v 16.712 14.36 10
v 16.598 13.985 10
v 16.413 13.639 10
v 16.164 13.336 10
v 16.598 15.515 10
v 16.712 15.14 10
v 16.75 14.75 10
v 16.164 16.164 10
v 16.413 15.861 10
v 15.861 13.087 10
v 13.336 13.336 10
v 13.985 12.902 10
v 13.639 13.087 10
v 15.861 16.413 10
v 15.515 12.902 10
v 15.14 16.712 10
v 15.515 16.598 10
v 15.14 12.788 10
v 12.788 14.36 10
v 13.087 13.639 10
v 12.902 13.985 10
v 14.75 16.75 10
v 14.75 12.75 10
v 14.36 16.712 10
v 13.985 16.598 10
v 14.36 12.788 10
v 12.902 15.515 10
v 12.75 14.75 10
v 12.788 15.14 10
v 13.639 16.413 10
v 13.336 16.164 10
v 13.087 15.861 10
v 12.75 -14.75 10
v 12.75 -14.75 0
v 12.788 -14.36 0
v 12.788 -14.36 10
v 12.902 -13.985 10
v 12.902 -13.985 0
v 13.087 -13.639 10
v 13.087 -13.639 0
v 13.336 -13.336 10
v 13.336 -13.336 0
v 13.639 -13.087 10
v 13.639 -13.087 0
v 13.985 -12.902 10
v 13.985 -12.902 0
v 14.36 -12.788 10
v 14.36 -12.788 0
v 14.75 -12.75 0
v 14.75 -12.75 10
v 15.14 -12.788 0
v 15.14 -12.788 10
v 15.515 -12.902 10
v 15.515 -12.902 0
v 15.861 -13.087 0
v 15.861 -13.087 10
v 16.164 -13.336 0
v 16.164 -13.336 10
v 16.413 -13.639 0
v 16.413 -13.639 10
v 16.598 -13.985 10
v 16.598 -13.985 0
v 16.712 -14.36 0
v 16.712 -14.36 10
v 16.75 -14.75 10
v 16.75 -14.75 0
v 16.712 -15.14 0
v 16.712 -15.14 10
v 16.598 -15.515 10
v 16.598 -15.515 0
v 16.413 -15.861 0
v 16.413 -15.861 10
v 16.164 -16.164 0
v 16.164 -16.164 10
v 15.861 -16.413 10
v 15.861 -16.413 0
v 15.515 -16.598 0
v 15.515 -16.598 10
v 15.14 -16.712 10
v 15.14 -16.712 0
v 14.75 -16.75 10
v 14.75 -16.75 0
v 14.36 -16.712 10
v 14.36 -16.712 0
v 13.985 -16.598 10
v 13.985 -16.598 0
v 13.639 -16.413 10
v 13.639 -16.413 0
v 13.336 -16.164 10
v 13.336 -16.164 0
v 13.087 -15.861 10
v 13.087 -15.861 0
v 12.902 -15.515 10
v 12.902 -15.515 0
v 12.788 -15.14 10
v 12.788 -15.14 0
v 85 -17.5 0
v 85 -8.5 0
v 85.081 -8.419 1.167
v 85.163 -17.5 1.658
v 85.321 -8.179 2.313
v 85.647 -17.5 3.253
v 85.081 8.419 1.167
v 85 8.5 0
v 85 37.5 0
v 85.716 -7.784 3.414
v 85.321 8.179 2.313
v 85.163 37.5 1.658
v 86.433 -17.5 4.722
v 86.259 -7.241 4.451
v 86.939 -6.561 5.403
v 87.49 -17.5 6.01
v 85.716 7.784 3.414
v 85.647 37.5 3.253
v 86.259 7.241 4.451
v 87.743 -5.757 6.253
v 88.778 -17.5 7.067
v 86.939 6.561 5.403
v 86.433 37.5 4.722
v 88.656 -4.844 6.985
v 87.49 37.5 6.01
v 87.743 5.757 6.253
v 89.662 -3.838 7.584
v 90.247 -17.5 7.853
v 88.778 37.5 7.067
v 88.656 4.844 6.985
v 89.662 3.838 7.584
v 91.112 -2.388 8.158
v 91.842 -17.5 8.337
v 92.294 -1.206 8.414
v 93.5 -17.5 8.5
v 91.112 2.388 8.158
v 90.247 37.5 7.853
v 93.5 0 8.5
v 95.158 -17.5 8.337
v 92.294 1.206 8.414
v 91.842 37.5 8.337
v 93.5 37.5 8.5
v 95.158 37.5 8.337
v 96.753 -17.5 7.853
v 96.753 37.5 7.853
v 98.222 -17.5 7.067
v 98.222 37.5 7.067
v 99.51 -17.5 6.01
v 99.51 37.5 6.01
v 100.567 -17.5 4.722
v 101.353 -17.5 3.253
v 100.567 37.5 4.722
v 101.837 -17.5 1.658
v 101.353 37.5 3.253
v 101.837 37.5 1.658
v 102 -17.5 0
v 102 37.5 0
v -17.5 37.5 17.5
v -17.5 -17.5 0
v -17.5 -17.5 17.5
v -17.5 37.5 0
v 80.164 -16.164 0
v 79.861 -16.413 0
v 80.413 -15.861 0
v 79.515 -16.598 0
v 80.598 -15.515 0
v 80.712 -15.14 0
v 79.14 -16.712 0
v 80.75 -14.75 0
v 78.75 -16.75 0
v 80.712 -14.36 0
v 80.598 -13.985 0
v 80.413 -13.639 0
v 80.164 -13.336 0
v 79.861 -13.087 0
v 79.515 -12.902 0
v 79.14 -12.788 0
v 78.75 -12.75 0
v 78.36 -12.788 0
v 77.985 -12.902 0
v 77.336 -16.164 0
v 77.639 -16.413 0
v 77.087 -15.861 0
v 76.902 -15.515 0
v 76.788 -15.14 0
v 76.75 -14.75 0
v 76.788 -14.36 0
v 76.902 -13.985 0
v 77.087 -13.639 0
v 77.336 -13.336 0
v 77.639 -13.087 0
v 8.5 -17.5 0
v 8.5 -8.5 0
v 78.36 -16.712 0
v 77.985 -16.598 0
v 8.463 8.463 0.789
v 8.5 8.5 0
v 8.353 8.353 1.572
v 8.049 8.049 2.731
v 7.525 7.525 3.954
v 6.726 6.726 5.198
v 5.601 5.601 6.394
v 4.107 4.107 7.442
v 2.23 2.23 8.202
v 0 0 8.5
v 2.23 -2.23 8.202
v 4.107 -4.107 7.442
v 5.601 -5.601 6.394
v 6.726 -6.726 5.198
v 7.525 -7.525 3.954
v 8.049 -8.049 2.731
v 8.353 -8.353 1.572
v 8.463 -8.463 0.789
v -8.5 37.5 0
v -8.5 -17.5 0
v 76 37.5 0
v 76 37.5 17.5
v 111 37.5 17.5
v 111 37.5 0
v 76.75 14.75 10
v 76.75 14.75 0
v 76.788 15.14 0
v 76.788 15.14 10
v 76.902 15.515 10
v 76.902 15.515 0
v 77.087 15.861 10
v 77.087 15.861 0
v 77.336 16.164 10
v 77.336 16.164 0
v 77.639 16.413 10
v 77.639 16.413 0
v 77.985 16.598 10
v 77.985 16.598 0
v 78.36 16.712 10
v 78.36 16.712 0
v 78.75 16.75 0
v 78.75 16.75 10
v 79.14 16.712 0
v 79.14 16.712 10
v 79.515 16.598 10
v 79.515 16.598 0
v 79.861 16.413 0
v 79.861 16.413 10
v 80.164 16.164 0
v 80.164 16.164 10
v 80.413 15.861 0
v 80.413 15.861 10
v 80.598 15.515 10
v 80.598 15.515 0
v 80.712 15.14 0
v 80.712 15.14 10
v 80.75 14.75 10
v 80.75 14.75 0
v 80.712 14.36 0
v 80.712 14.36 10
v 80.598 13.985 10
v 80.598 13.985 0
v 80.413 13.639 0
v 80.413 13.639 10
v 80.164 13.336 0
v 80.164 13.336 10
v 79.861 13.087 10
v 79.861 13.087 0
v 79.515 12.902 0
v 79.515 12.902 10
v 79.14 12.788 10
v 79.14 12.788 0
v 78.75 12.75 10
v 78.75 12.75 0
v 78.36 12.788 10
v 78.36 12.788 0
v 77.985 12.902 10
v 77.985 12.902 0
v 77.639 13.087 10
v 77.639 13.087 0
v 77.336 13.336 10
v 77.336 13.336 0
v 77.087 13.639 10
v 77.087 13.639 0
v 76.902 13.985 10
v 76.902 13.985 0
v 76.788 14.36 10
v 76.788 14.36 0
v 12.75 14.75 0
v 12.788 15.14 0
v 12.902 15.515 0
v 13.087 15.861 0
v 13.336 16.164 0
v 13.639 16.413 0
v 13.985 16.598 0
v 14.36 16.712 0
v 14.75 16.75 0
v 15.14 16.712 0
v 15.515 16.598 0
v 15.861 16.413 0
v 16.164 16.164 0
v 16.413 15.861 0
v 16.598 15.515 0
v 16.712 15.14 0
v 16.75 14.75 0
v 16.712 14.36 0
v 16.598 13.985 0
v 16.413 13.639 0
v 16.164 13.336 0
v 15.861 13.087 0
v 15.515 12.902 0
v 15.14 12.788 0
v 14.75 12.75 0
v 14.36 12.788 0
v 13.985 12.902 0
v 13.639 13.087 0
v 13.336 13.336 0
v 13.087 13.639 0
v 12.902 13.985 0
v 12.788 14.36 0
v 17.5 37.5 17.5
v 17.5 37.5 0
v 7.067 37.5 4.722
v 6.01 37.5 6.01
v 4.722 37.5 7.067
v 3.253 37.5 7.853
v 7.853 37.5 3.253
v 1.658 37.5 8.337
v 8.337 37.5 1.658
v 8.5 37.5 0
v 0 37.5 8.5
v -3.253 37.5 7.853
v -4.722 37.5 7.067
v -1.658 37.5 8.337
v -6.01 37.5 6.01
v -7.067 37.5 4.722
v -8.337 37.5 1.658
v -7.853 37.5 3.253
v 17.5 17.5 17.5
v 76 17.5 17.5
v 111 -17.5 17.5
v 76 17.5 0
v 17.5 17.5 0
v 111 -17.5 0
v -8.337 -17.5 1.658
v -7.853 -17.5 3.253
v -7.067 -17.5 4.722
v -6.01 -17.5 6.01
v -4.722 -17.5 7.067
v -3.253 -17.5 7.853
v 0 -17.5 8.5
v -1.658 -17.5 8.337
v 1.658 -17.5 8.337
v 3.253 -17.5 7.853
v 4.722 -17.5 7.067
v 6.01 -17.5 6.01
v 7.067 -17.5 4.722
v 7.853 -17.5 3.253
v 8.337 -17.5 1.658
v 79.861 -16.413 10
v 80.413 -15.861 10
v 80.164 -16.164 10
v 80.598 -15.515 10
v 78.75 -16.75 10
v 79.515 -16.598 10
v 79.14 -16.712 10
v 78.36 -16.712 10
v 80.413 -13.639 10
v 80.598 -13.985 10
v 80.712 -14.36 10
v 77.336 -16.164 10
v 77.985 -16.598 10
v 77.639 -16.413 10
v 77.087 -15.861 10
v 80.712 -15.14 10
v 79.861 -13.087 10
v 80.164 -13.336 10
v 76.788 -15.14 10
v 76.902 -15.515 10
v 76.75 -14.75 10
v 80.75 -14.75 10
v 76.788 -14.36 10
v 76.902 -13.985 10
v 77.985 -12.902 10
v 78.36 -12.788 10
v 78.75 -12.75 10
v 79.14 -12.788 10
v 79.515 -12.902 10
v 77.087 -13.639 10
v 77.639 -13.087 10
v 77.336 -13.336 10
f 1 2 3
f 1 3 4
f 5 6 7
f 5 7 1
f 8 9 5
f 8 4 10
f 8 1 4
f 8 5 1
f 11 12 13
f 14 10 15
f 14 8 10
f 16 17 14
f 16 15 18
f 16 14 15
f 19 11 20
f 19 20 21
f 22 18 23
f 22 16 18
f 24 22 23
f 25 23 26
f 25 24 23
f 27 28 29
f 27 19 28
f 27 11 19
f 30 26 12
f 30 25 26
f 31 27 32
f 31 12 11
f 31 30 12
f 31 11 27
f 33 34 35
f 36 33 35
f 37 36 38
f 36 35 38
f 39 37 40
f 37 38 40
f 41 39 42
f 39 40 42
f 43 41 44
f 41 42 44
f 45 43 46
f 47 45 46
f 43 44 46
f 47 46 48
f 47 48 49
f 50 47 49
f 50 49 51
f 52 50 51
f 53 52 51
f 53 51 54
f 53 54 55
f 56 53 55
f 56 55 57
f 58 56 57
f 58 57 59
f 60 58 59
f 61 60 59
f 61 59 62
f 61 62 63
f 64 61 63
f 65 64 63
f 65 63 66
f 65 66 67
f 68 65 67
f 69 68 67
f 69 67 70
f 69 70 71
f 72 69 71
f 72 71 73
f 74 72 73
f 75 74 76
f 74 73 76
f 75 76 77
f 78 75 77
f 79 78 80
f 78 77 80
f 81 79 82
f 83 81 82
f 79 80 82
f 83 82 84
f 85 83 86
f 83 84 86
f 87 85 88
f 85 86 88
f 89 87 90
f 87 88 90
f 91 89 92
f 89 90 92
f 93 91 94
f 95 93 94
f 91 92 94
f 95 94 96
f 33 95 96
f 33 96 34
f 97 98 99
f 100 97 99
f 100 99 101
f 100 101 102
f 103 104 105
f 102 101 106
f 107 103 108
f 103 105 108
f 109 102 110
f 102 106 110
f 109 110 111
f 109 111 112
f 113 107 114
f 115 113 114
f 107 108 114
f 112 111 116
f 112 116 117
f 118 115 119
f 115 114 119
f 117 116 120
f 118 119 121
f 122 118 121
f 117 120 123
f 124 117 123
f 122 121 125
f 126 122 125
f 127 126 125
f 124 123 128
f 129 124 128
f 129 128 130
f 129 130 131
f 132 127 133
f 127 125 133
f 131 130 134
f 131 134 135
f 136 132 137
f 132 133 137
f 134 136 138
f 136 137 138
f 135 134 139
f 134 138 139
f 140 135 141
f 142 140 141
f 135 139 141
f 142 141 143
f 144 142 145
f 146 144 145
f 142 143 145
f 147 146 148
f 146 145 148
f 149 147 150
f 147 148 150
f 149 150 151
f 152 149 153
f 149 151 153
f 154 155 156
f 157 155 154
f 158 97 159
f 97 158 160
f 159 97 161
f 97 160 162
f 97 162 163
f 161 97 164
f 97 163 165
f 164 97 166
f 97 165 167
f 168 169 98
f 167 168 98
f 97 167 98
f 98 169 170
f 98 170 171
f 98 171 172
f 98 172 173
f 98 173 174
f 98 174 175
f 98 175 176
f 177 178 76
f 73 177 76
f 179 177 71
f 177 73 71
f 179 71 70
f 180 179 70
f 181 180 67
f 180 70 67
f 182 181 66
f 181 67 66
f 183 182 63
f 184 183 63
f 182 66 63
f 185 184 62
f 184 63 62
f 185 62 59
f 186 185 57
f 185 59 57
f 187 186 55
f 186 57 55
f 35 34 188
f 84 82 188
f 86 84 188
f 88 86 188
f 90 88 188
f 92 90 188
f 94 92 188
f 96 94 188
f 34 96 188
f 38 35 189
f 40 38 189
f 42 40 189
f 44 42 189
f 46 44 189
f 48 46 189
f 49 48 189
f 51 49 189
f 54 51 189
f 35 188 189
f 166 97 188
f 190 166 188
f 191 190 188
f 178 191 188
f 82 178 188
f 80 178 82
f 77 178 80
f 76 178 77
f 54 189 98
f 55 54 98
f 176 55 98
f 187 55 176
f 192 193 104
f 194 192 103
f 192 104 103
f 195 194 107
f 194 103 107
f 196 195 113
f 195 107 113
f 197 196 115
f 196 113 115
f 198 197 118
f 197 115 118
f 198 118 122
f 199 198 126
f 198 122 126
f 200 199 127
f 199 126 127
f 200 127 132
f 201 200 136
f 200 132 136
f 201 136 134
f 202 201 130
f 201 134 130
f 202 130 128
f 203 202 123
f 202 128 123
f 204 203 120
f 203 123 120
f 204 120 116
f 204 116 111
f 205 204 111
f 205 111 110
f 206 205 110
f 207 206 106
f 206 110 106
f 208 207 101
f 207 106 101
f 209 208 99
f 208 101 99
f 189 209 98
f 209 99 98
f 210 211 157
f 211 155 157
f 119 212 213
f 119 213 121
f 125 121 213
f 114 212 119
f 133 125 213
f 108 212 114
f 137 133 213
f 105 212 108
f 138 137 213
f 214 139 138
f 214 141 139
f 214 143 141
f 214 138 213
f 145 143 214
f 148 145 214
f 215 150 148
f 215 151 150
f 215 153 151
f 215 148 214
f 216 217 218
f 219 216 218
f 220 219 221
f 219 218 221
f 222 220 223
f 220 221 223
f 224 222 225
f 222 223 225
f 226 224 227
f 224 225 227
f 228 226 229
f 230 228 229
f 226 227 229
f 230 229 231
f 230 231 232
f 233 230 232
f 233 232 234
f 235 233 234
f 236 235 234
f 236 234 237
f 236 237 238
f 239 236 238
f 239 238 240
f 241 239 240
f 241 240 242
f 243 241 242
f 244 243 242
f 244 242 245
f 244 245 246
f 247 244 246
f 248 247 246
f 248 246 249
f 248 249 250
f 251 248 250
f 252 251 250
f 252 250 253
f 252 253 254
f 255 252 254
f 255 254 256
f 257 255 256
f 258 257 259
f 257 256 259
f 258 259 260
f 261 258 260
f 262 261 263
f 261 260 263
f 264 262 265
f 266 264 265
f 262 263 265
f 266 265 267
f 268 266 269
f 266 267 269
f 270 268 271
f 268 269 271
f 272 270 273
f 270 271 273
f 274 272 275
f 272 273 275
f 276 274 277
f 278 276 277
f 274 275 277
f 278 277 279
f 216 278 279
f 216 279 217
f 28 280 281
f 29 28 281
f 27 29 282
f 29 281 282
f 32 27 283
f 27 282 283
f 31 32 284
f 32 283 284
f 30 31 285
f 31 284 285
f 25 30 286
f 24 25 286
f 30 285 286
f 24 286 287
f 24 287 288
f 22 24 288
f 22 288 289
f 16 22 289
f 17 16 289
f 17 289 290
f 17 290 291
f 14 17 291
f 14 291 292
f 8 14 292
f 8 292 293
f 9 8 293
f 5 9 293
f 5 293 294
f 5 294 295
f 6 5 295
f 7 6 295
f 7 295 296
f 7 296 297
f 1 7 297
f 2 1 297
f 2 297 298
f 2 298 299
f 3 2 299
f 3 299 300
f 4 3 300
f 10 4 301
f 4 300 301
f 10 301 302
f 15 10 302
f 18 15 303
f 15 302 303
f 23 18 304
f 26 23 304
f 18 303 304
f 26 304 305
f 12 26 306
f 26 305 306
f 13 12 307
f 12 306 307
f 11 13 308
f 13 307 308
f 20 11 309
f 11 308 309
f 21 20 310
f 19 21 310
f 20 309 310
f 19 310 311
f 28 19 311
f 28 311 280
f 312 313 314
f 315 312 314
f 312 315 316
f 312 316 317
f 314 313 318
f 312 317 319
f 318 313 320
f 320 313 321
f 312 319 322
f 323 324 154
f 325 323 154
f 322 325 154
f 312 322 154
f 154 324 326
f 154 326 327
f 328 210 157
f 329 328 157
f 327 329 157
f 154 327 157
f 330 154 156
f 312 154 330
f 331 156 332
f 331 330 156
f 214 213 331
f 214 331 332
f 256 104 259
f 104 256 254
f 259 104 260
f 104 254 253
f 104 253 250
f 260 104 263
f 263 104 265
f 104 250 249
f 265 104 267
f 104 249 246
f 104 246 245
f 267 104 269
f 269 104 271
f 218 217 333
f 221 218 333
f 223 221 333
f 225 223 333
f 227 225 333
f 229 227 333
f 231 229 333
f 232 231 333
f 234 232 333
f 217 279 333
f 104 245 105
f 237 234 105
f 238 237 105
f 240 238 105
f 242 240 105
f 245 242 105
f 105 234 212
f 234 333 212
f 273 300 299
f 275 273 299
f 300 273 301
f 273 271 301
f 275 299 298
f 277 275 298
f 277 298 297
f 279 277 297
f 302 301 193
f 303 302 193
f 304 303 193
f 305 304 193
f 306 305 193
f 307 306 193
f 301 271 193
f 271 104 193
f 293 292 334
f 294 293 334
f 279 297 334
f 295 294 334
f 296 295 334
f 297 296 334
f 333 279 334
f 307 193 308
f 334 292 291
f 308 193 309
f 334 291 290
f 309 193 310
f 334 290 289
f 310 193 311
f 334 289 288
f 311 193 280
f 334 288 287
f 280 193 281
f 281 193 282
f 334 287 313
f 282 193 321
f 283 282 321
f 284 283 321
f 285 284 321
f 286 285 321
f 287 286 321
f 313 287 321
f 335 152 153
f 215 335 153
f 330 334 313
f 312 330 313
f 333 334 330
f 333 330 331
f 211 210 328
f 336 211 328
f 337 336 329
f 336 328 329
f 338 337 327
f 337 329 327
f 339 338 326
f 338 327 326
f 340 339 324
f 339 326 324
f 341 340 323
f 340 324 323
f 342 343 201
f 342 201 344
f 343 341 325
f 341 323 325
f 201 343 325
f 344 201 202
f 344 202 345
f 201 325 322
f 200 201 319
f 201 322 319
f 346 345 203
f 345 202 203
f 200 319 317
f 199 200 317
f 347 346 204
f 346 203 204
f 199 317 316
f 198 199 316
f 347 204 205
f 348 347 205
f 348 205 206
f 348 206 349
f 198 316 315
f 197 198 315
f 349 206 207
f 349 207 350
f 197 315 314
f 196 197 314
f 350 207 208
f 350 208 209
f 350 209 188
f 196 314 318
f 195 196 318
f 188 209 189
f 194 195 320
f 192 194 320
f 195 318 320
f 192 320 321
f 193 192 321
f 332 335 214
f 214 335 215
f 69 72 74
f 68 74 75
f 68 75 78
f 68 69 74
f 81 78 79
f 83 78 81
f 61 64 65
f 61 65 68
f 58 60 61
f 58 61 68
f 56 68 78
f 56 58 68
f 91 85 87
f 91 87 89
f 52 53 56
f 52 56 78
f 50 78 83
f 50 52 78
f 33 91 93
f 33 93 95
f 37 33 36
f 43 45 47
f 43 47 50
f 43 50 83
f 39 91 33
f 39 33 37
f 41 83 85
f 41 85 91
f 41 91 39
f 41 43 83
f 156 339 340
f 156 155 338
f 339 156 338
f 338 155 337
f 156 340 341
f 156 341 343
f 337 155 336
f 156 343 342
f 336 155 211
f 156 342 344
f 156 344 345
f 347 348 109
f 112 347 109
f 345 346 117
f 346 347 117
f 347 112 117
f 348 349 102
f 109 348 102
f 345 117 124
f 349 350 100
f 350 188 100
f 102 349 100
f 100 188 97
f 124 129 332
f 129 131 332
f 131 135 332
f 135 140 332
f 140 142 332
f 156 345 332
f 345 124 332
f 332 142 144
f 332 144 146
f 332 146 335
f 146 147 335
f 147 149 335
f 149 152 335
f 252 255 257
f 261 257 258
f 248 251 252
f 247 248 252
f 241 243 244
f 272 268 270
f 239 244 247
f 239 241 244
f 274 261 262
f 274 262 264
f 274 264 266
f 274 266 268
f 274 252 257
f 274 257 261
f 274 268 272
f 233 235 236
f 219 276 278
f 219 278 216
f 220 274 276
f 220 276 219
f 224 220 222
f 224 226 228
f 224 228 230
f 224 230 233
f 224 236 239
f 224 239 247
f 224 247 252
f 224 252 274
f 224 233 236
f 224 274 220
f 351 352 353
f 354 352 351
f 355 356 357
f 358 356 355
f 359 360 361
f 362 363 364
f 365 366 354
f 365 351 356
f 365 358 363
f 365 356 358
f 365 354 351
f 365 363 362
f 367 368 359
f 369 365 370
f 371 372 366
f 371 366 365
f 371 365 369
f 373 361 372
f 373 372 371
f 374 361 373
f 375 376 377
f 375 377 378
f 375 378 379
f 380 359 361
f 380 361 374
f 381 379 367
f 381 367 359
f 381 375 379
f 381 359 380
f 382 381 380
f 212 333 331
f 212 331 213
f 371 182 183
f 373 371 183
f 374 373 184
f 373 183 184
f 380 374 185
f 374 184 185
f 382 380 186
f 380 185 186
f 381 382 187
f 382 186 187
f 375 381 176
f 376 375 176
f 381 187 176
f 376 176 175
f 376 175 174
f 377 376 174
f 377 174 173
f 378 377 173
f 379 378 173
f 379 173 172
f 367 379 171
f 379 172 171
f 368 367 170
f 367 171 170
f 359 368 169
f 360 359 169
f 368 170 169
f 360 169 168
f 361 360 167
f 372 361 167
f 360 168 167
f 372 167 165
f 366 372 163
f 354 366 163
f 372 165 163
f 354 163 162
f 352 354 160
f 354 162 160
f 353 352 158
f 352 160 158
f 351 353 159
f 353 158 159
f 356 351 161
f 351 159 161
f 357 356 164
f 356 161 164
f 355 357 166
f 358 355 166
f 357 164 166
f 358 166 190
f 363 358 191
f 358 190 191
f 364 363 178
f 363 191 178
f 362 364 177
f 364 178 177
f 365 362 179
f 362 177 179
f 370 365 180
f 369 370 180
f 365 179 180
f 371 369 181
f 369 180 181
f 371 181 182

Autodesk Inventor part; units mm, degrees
ref_plane "YZ Plane" through (0, 0, 0) normal (1, 0, 0) x (0, 1, 0)
ref_plane "XZ Plane" through (0, 0, 0) normal (0, 1, 0) x (-1, 0, 0)
ref_plane "XY Plane" through (0, 0, 0) normal (0, 0, 1) x (1, 0, 0)
sketch "Sketch1" plane through (0, 0, 0) normal (0, 0, 1) x (1, 0, 0)
  line L0 (0, 0) -> (93.5, 0)
  line L1 (93.5, 0) -> (93.5, 150)
  line L2 (93.5, 150) -> (0, 150)
  line L3 (0, 150) -> (0, 0)
  dimension "d0" = 93.5
  dimension "d1" = 150
sketch "Sketch2" plane through (0, 0, 0) normal (1, 0, 0) x (0, 1, 0)
  circle A0 centre (0, 0) radius 12.5
  circle A1 centre (0, 0) radius 8.5
  line L0 (-12.5, 0) -> (12.5, 0)
  line L1 (12.5, 0) -> (12.5, 12.5)
  line L2 (12.5, 12.5) -> (-12.5, 12.5)
  line L3 (-12.5, 12.5) -> (-12.5, 0)
  circle A2 centre (150, 0) radius 12.5
  circle A3 centre (150, 0) radius 8.5
  line L4 (137.5, 0) -> (162.5, 0)
  line L5 (162.5, 0) -> (162.5, 12.5)
  line L6 (162.5, 12.5) -> (137.5, 12.5)
  line L7 (137.5, 12.5) -> (137.5, 0)
  line L8 (-12.5, 12.5) -> (-17.5, 12.5)
  line L9 (-17.5, 12.5) -> (-17.5, 0)
  line L10 (-17.5, 0) -> (-12.5, 0)
  line L11 (-12.5, 0) -> (-12.5, 12.5)
  line L12 (12.5, 12.5) -> (17.5, 12.5)
  line L13 (17.5, 12.5) -> (17.5, 0)
  line L14 (17.5, 0) -> (12.5, 0)
  line L15 (12.5, 0) -> (12.5, 12.5)
  point P0 (8.5, 0)
  point P1 (-8.5, 0)
  point P2 (150, 0)
  point P3 (12.5, 0)
  dimension "d2" = 25
  dimension "d3" = 17
  dimension "d6" = 5
  dimension "d7" = 5
  dimension "d8" = 35
extrude "Extrusion1" add sketch "Sketch2" along normal up to surface (93.5 mm away) contours L3 L2 A0 | A0 L0 A1 | L10 L9 L8 L3 | A0 L2 L1 | L1 L12 L13 L14 | A1 L0 picked at (11.0622, 0.9272) picked at (2.1208, 1.8788)
ref_plane "Work Plane1" through (46.75, 0, 0) normal (-1, 0, 0) x (0, 0, 1)
sketch "Sketch3" plane through (0, -17.5, 0) normal (0, -1, 0) x (1, 0, 0)
  line L0 (0, 12.5) -> (93.5, 12.5) projected
  line L1 (76, 12.5) -> (111, 12.5)
  line L2 (111, 12.5) -> (111, 0)
  line L3 (111, 0) -> (76, 0)
  line L4 (76, 0) -> (76, 12.5)
  line L5 (93.5, 12.5) -> (93.5, 0) projected
  circle A0 centre (93.5, 0) radius 8.5
  point P0 (0, 0)
  point P1 (93.5, 12.5)
  point P2 (102, 0)
  point P3 (85, 0)
  dimension "d9" = 35
  dimension "d33" = 17
extrude "Extrusion2" add sketch "Sketch3" against normal blind 55 contours L0 L5 A0 L3 L4 | L1 L2 L3 A0 L5 | A0 L3 L5 | L5 L3 A0
extrude "Extrusion4" cut sketch "Sketch3" along normal through all both and the other way through all contours A0 L3 L5 | L5 L3 A0
extrude "Extrusion3" cut sketch "Sketch2" along normal up to surface (93.5 mm away) contours A1 L0 picked at (2.1208, 1.8788)
mirror "Mirror1" about plane through (46.75, 0, 0) normal (-1, 0, 0) of "Extrusion2", "Extrusion4", "Extrusion3"
sketch "Sketch4" plane through (76, 17.5, 12.5) normal (0, 0, 1) x (1, 0, 0)
  line L0 (-93.5, -35) -> (35, -35) projected
  line L1 (0, 20) -> (35, 20) projected
  line L2 (0, 0) -> (0, 20) projected
  line L3 (-58.5, 0) -> (0, 0) projected
  line L4 (-58.5, 0) -> (-58.5, 20) projected
  line L5 (-58.5, 20) -> (-93.5, 20) projected
  line L6 (35, -35) -> (35, 20) projected
  line L7 (-93.5, -35) -> (-93.5, 20) projected
  point P0 (-76, -17.5)
extrude "Extrusion5" add sketch "Sketch4" along normal blind 5
sketch "Sketch5" plane through (76, 17.5, 0) normal (0, 0, -1) x (-1, 0, 0)
  circle A0 centre (-2.75, -2.75) radius 2
  line L0 (-9, -9) -> (67.5, -9) projected
  line L1 (-9, 20) -> (-9, -9) projected
  circle A1 centre (61.25, -2.75) radius 2
  circle A2 centre (-2.75, -32.25) radius 2
  circle A3 centre (61.25, -32.25) radius 2
  line L2 (67.5, -35) -> (67.5, -26) projected
  line L3 (67.5, -26) -> (-9, -26) projected
  point P0 (76, -17.5)
  dimension "d18" = 4
  dimension "d19" = 6.25
  dimension "d20" = 6.25
  dimension "d23" = 64
  dimension "d26" = 29.5
  dimension "d29" = 6.25
  dimension "d30" = 6.25
extrude "Extrusion6" cut sketch "Sketch5" against normal blind 10
equation "\"d7\" = d6"
equation "\"d9\" = d8"
equation "\"d33\" = d3"
properties part number "ElectronicsHalf"
